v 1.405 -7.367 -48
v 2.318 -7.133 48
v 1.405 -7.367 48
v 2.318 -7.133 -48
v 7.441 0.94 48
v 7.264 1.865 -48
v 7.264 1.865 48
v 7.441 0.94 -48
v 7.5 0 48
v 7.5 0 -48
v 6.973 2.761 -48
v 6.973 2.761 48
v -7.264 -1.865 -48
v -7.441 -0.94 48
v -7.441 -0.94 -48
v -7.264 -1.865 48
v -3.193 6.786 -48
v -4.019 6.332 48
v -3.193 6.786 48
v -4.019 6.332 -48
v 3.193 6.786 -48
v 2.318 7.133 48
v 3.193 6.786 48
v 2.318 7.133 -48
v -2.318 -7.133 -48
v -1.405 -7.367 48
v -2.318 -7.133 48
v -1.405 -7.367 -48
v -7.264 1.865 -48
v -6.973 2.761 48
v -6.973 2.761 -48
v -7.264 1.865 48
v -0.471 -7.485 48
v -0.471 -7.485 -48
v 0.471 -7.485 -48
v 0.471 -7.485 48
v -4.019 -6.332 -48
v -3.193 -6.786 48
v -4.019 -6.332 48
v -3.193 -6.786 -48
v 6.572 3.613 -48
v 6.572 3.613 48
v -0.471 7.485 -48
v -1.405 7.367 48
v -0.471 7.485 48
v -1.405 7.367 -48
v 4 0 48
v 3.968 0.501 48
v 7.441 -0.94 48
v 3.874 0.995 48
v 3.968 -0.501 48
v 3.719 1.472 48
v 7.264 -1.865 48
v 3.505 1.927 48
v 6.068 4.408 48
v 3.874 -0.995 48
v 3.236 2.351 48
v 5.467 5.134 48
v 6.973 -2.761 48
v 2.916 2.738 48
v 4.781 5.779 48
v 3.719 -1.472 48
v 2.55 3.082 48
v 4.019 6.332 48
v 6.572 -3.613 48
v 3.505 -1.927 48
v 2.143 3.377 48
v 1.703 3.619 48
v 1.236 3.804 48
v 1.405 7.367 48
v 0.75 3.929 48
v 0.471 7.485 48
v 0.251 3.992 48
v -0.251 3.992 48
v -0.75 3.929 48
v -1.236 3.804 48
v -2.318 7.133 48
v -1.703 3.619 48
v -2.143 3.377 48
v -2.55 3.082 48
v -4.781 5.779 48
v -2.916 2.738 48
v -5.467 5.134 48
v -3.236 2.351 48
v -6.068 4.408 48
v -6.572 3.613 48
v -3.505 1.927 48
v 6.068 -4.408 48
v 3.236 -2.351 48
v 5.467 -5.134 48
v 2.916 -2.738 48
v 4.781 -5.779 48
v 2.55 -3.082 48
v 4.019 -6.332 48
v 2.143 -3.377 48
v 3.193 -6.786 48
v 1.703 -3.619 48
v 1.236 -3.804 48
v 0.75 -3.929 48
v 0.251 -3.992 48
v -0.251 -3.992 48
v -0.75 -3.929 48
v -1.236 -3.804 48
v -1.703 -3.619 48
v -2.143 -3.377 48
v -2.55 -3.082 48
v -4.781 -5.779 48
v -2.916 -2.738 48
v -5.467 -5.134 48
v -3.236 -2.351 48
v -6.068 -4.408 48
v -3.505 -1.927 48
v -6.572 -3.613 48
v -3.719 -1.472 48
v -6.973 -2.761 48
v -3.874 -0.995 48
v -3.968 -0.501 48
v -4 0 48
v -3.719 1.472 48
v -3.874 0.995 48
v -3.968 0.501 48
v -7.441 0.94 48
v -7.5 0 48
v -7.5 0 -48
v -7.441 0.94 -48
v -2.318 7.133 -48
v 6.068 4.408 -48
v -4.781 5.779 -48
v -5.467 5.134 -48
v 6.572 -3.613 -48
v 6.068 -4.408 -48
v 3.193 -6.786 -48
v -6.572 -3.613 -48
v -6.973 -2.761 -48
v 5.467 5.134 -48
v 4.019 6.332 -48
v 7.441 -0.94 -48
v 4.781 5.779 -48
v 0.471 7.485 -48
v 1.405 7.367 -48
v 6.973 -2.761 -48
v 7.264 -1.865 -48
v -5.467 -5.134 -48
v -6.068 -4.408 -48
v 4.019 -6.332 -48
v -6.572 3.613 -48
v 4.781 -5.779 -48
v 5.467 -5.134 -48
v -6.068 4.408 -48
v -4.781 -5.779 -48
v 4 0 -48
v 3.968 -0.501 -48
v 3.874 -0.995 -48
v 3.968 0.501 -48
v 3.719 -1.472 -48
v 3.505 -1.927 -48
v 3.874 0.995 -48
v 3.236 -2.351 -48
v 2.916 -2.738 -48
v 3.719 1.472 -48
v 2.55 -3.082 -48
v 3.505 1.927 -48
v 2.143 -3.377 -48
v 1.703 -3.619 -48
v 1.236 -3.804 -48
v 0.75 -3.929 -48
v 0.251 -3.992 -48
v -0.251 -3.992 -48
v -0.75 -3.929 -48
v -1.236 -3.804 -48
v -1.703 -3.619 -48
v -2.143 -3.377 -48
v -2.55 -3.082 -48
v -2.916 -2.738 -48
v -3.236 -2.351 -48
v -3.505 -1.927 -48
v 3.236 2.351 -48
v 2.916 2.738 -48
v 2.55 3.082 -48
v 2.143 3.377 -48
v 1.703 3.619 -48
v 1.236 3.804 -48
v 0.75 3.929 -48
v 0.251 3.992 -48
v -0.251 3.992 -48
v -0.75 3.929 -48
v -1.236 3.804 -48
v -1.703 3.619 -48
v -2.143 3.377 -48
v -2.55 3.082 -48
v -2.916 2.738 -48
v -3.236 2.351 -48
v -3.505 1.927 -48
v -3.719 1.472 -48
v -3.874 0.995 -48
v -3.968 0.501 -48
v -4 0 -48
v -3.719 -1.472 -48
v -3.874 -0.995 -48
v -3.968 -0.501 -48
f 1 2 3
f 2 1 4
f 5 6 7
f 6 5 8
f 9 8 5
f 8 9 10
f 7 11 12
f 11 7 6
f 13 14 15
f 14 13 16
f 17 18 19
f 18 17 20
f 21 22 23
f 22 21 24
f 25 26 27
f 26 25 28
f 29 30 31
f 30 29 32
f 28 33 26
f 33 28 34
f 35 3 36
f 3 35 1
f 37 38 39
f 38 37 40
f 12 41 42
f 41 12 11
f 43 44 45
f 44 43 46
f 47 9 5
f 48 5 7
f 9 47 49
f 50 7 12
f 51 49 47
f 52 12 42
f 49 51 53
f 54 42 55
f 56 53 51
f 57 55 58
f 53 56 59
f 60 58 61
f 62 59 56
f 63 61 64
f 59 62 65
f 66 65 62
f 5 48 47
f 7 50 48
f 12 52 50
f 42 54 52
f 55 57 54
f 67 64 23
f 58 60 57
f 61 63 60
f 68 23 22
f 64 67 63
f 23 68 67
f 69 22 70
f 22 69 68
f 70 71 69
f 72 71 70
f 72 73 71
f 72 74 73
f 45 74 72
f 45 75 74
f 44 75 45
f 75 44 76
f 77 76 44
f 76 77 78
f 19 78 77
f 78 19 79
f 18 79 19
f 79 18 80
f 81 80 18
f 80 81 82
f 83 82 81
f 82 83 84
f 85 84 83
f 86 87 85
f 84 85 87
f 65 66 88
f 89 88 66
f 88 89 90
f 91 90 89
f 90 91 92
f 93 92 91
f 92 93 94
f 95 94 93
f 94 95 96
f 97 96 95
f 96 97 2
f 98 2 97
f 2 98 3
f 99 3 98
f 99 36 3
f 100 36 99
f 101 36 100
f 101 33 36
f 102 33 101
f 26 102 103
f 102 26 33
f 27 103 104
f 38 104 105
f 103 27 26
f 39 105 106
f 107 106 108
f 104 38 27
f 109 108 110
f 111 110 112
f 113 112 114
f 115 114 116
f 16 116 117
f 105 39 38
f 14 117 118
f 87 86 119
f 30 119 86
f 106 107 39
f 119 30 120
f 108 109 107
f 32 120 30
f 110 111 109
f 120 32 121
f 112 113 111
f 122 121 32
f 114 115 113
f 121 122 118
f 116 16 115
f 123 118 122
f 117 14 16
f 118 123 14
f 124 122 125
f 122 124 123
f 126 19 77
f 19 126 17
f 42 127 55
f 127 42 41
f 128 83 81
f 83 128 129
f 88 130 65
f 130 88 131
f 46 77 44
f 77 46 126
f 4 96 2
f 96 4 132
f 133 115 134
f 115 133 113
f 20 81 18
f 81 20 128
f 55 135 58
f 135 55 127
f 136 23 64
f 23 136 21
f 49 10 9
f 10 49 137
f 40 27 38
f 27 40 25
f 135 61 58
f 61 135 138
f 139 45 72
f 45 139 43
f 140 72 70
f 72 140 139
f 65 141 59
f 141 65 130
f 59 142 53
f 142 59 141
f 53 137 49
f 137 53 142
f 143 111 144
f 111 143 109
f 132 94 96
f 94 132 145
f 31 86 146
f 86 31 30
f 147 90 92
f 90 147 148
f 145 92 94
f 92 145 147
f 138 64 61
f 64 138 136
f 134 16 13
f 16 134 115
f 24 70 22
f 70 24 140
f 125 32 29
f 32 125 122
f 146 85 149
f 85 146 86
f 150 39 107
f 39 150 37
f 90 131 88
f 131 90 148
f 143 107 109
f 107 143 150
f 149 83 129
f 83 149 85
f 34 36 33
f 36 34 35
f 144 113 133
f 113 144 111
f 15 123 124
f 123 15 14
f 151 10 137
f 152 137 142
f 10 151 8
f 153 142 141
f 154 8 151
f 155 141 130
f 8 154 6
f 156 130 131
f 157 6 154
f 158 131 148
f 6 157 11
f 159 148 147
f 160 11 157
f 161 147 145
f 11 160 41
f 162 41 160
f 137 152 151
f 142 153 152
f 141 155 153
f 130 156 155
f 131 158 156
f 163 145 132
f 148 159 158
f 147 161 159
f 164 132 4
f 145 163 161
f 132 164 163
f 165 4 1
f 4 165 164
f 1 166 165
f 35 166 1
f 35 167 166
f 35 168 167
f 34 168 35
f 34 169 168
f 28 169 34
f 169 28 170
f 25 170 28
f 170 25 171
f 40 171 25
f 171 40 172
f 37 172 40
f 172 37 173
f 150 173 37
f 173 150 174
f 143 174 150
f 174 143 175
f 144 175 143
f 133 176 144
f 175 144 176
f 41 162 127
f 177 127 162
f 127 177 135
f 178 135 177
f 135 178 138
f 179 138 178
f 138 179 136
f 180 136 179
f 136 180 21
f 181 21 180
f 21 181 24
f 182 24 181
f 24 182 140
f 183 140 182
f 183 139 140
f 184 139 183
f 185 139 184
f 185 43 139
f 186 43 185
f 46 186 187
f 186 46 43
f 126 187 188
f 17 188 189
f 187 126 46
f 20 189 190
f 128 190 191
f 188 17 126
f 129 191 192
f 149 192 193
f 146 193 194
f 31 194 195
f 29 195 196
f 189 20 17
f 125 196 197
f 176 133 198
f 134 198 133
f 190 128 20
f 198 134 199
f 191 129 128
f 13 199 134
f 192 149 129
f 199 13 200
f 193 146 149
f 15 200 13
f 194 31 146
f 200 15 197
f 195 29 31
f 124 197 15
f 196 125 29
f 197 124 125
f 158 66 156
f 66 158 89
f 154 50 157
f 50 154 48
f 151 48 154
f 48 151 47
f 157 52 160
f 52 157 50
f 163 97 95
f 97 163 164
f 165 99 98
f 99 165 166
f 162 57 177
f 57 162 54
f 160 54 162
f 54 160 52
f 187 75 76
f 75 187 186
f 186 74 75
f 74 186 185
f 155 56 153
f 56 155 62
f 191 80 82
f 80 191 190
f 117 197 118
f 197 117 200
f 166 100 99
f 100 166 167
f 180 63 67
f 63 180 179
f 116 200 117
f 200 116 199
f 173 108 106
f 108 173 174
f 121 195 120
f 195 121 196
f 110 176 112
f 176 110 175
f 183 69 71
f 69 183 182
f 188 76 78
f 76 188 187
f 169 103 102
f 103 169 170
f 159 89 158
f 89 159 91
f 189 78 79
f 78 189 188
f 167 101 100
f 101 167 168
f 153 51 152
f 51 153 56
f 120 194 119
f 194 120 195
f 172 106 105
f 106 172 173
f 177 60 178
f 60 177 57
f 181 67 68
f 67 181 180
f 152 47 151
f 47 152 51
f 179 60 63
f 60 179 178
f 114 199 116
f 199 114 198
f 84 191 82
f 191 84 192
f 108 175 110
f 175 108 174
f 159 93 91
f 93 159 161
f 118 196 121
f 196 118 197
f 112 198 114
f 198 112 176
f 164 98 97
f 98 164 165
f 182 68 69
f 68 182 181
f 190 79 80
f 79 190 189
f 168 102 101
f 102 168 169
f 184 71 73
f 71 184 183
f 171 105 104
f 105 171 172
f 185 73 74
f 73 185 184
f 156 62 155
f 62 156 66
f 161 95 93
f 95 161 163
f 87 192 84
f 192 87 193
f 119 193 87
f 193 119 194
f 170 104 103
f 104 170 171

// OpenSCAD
$fn = 50;


difference() {
	union() {
		translate(v = [0, 0, -48.0000000000]) {
			cylinder(h = 96, r = 7.5000000000);
		}
	}
	union() {
		translate(v = [0, 0, -100.0000000000]) {
			cylinder(h = 200, r = 4.0000000000);
		}
	}
}
